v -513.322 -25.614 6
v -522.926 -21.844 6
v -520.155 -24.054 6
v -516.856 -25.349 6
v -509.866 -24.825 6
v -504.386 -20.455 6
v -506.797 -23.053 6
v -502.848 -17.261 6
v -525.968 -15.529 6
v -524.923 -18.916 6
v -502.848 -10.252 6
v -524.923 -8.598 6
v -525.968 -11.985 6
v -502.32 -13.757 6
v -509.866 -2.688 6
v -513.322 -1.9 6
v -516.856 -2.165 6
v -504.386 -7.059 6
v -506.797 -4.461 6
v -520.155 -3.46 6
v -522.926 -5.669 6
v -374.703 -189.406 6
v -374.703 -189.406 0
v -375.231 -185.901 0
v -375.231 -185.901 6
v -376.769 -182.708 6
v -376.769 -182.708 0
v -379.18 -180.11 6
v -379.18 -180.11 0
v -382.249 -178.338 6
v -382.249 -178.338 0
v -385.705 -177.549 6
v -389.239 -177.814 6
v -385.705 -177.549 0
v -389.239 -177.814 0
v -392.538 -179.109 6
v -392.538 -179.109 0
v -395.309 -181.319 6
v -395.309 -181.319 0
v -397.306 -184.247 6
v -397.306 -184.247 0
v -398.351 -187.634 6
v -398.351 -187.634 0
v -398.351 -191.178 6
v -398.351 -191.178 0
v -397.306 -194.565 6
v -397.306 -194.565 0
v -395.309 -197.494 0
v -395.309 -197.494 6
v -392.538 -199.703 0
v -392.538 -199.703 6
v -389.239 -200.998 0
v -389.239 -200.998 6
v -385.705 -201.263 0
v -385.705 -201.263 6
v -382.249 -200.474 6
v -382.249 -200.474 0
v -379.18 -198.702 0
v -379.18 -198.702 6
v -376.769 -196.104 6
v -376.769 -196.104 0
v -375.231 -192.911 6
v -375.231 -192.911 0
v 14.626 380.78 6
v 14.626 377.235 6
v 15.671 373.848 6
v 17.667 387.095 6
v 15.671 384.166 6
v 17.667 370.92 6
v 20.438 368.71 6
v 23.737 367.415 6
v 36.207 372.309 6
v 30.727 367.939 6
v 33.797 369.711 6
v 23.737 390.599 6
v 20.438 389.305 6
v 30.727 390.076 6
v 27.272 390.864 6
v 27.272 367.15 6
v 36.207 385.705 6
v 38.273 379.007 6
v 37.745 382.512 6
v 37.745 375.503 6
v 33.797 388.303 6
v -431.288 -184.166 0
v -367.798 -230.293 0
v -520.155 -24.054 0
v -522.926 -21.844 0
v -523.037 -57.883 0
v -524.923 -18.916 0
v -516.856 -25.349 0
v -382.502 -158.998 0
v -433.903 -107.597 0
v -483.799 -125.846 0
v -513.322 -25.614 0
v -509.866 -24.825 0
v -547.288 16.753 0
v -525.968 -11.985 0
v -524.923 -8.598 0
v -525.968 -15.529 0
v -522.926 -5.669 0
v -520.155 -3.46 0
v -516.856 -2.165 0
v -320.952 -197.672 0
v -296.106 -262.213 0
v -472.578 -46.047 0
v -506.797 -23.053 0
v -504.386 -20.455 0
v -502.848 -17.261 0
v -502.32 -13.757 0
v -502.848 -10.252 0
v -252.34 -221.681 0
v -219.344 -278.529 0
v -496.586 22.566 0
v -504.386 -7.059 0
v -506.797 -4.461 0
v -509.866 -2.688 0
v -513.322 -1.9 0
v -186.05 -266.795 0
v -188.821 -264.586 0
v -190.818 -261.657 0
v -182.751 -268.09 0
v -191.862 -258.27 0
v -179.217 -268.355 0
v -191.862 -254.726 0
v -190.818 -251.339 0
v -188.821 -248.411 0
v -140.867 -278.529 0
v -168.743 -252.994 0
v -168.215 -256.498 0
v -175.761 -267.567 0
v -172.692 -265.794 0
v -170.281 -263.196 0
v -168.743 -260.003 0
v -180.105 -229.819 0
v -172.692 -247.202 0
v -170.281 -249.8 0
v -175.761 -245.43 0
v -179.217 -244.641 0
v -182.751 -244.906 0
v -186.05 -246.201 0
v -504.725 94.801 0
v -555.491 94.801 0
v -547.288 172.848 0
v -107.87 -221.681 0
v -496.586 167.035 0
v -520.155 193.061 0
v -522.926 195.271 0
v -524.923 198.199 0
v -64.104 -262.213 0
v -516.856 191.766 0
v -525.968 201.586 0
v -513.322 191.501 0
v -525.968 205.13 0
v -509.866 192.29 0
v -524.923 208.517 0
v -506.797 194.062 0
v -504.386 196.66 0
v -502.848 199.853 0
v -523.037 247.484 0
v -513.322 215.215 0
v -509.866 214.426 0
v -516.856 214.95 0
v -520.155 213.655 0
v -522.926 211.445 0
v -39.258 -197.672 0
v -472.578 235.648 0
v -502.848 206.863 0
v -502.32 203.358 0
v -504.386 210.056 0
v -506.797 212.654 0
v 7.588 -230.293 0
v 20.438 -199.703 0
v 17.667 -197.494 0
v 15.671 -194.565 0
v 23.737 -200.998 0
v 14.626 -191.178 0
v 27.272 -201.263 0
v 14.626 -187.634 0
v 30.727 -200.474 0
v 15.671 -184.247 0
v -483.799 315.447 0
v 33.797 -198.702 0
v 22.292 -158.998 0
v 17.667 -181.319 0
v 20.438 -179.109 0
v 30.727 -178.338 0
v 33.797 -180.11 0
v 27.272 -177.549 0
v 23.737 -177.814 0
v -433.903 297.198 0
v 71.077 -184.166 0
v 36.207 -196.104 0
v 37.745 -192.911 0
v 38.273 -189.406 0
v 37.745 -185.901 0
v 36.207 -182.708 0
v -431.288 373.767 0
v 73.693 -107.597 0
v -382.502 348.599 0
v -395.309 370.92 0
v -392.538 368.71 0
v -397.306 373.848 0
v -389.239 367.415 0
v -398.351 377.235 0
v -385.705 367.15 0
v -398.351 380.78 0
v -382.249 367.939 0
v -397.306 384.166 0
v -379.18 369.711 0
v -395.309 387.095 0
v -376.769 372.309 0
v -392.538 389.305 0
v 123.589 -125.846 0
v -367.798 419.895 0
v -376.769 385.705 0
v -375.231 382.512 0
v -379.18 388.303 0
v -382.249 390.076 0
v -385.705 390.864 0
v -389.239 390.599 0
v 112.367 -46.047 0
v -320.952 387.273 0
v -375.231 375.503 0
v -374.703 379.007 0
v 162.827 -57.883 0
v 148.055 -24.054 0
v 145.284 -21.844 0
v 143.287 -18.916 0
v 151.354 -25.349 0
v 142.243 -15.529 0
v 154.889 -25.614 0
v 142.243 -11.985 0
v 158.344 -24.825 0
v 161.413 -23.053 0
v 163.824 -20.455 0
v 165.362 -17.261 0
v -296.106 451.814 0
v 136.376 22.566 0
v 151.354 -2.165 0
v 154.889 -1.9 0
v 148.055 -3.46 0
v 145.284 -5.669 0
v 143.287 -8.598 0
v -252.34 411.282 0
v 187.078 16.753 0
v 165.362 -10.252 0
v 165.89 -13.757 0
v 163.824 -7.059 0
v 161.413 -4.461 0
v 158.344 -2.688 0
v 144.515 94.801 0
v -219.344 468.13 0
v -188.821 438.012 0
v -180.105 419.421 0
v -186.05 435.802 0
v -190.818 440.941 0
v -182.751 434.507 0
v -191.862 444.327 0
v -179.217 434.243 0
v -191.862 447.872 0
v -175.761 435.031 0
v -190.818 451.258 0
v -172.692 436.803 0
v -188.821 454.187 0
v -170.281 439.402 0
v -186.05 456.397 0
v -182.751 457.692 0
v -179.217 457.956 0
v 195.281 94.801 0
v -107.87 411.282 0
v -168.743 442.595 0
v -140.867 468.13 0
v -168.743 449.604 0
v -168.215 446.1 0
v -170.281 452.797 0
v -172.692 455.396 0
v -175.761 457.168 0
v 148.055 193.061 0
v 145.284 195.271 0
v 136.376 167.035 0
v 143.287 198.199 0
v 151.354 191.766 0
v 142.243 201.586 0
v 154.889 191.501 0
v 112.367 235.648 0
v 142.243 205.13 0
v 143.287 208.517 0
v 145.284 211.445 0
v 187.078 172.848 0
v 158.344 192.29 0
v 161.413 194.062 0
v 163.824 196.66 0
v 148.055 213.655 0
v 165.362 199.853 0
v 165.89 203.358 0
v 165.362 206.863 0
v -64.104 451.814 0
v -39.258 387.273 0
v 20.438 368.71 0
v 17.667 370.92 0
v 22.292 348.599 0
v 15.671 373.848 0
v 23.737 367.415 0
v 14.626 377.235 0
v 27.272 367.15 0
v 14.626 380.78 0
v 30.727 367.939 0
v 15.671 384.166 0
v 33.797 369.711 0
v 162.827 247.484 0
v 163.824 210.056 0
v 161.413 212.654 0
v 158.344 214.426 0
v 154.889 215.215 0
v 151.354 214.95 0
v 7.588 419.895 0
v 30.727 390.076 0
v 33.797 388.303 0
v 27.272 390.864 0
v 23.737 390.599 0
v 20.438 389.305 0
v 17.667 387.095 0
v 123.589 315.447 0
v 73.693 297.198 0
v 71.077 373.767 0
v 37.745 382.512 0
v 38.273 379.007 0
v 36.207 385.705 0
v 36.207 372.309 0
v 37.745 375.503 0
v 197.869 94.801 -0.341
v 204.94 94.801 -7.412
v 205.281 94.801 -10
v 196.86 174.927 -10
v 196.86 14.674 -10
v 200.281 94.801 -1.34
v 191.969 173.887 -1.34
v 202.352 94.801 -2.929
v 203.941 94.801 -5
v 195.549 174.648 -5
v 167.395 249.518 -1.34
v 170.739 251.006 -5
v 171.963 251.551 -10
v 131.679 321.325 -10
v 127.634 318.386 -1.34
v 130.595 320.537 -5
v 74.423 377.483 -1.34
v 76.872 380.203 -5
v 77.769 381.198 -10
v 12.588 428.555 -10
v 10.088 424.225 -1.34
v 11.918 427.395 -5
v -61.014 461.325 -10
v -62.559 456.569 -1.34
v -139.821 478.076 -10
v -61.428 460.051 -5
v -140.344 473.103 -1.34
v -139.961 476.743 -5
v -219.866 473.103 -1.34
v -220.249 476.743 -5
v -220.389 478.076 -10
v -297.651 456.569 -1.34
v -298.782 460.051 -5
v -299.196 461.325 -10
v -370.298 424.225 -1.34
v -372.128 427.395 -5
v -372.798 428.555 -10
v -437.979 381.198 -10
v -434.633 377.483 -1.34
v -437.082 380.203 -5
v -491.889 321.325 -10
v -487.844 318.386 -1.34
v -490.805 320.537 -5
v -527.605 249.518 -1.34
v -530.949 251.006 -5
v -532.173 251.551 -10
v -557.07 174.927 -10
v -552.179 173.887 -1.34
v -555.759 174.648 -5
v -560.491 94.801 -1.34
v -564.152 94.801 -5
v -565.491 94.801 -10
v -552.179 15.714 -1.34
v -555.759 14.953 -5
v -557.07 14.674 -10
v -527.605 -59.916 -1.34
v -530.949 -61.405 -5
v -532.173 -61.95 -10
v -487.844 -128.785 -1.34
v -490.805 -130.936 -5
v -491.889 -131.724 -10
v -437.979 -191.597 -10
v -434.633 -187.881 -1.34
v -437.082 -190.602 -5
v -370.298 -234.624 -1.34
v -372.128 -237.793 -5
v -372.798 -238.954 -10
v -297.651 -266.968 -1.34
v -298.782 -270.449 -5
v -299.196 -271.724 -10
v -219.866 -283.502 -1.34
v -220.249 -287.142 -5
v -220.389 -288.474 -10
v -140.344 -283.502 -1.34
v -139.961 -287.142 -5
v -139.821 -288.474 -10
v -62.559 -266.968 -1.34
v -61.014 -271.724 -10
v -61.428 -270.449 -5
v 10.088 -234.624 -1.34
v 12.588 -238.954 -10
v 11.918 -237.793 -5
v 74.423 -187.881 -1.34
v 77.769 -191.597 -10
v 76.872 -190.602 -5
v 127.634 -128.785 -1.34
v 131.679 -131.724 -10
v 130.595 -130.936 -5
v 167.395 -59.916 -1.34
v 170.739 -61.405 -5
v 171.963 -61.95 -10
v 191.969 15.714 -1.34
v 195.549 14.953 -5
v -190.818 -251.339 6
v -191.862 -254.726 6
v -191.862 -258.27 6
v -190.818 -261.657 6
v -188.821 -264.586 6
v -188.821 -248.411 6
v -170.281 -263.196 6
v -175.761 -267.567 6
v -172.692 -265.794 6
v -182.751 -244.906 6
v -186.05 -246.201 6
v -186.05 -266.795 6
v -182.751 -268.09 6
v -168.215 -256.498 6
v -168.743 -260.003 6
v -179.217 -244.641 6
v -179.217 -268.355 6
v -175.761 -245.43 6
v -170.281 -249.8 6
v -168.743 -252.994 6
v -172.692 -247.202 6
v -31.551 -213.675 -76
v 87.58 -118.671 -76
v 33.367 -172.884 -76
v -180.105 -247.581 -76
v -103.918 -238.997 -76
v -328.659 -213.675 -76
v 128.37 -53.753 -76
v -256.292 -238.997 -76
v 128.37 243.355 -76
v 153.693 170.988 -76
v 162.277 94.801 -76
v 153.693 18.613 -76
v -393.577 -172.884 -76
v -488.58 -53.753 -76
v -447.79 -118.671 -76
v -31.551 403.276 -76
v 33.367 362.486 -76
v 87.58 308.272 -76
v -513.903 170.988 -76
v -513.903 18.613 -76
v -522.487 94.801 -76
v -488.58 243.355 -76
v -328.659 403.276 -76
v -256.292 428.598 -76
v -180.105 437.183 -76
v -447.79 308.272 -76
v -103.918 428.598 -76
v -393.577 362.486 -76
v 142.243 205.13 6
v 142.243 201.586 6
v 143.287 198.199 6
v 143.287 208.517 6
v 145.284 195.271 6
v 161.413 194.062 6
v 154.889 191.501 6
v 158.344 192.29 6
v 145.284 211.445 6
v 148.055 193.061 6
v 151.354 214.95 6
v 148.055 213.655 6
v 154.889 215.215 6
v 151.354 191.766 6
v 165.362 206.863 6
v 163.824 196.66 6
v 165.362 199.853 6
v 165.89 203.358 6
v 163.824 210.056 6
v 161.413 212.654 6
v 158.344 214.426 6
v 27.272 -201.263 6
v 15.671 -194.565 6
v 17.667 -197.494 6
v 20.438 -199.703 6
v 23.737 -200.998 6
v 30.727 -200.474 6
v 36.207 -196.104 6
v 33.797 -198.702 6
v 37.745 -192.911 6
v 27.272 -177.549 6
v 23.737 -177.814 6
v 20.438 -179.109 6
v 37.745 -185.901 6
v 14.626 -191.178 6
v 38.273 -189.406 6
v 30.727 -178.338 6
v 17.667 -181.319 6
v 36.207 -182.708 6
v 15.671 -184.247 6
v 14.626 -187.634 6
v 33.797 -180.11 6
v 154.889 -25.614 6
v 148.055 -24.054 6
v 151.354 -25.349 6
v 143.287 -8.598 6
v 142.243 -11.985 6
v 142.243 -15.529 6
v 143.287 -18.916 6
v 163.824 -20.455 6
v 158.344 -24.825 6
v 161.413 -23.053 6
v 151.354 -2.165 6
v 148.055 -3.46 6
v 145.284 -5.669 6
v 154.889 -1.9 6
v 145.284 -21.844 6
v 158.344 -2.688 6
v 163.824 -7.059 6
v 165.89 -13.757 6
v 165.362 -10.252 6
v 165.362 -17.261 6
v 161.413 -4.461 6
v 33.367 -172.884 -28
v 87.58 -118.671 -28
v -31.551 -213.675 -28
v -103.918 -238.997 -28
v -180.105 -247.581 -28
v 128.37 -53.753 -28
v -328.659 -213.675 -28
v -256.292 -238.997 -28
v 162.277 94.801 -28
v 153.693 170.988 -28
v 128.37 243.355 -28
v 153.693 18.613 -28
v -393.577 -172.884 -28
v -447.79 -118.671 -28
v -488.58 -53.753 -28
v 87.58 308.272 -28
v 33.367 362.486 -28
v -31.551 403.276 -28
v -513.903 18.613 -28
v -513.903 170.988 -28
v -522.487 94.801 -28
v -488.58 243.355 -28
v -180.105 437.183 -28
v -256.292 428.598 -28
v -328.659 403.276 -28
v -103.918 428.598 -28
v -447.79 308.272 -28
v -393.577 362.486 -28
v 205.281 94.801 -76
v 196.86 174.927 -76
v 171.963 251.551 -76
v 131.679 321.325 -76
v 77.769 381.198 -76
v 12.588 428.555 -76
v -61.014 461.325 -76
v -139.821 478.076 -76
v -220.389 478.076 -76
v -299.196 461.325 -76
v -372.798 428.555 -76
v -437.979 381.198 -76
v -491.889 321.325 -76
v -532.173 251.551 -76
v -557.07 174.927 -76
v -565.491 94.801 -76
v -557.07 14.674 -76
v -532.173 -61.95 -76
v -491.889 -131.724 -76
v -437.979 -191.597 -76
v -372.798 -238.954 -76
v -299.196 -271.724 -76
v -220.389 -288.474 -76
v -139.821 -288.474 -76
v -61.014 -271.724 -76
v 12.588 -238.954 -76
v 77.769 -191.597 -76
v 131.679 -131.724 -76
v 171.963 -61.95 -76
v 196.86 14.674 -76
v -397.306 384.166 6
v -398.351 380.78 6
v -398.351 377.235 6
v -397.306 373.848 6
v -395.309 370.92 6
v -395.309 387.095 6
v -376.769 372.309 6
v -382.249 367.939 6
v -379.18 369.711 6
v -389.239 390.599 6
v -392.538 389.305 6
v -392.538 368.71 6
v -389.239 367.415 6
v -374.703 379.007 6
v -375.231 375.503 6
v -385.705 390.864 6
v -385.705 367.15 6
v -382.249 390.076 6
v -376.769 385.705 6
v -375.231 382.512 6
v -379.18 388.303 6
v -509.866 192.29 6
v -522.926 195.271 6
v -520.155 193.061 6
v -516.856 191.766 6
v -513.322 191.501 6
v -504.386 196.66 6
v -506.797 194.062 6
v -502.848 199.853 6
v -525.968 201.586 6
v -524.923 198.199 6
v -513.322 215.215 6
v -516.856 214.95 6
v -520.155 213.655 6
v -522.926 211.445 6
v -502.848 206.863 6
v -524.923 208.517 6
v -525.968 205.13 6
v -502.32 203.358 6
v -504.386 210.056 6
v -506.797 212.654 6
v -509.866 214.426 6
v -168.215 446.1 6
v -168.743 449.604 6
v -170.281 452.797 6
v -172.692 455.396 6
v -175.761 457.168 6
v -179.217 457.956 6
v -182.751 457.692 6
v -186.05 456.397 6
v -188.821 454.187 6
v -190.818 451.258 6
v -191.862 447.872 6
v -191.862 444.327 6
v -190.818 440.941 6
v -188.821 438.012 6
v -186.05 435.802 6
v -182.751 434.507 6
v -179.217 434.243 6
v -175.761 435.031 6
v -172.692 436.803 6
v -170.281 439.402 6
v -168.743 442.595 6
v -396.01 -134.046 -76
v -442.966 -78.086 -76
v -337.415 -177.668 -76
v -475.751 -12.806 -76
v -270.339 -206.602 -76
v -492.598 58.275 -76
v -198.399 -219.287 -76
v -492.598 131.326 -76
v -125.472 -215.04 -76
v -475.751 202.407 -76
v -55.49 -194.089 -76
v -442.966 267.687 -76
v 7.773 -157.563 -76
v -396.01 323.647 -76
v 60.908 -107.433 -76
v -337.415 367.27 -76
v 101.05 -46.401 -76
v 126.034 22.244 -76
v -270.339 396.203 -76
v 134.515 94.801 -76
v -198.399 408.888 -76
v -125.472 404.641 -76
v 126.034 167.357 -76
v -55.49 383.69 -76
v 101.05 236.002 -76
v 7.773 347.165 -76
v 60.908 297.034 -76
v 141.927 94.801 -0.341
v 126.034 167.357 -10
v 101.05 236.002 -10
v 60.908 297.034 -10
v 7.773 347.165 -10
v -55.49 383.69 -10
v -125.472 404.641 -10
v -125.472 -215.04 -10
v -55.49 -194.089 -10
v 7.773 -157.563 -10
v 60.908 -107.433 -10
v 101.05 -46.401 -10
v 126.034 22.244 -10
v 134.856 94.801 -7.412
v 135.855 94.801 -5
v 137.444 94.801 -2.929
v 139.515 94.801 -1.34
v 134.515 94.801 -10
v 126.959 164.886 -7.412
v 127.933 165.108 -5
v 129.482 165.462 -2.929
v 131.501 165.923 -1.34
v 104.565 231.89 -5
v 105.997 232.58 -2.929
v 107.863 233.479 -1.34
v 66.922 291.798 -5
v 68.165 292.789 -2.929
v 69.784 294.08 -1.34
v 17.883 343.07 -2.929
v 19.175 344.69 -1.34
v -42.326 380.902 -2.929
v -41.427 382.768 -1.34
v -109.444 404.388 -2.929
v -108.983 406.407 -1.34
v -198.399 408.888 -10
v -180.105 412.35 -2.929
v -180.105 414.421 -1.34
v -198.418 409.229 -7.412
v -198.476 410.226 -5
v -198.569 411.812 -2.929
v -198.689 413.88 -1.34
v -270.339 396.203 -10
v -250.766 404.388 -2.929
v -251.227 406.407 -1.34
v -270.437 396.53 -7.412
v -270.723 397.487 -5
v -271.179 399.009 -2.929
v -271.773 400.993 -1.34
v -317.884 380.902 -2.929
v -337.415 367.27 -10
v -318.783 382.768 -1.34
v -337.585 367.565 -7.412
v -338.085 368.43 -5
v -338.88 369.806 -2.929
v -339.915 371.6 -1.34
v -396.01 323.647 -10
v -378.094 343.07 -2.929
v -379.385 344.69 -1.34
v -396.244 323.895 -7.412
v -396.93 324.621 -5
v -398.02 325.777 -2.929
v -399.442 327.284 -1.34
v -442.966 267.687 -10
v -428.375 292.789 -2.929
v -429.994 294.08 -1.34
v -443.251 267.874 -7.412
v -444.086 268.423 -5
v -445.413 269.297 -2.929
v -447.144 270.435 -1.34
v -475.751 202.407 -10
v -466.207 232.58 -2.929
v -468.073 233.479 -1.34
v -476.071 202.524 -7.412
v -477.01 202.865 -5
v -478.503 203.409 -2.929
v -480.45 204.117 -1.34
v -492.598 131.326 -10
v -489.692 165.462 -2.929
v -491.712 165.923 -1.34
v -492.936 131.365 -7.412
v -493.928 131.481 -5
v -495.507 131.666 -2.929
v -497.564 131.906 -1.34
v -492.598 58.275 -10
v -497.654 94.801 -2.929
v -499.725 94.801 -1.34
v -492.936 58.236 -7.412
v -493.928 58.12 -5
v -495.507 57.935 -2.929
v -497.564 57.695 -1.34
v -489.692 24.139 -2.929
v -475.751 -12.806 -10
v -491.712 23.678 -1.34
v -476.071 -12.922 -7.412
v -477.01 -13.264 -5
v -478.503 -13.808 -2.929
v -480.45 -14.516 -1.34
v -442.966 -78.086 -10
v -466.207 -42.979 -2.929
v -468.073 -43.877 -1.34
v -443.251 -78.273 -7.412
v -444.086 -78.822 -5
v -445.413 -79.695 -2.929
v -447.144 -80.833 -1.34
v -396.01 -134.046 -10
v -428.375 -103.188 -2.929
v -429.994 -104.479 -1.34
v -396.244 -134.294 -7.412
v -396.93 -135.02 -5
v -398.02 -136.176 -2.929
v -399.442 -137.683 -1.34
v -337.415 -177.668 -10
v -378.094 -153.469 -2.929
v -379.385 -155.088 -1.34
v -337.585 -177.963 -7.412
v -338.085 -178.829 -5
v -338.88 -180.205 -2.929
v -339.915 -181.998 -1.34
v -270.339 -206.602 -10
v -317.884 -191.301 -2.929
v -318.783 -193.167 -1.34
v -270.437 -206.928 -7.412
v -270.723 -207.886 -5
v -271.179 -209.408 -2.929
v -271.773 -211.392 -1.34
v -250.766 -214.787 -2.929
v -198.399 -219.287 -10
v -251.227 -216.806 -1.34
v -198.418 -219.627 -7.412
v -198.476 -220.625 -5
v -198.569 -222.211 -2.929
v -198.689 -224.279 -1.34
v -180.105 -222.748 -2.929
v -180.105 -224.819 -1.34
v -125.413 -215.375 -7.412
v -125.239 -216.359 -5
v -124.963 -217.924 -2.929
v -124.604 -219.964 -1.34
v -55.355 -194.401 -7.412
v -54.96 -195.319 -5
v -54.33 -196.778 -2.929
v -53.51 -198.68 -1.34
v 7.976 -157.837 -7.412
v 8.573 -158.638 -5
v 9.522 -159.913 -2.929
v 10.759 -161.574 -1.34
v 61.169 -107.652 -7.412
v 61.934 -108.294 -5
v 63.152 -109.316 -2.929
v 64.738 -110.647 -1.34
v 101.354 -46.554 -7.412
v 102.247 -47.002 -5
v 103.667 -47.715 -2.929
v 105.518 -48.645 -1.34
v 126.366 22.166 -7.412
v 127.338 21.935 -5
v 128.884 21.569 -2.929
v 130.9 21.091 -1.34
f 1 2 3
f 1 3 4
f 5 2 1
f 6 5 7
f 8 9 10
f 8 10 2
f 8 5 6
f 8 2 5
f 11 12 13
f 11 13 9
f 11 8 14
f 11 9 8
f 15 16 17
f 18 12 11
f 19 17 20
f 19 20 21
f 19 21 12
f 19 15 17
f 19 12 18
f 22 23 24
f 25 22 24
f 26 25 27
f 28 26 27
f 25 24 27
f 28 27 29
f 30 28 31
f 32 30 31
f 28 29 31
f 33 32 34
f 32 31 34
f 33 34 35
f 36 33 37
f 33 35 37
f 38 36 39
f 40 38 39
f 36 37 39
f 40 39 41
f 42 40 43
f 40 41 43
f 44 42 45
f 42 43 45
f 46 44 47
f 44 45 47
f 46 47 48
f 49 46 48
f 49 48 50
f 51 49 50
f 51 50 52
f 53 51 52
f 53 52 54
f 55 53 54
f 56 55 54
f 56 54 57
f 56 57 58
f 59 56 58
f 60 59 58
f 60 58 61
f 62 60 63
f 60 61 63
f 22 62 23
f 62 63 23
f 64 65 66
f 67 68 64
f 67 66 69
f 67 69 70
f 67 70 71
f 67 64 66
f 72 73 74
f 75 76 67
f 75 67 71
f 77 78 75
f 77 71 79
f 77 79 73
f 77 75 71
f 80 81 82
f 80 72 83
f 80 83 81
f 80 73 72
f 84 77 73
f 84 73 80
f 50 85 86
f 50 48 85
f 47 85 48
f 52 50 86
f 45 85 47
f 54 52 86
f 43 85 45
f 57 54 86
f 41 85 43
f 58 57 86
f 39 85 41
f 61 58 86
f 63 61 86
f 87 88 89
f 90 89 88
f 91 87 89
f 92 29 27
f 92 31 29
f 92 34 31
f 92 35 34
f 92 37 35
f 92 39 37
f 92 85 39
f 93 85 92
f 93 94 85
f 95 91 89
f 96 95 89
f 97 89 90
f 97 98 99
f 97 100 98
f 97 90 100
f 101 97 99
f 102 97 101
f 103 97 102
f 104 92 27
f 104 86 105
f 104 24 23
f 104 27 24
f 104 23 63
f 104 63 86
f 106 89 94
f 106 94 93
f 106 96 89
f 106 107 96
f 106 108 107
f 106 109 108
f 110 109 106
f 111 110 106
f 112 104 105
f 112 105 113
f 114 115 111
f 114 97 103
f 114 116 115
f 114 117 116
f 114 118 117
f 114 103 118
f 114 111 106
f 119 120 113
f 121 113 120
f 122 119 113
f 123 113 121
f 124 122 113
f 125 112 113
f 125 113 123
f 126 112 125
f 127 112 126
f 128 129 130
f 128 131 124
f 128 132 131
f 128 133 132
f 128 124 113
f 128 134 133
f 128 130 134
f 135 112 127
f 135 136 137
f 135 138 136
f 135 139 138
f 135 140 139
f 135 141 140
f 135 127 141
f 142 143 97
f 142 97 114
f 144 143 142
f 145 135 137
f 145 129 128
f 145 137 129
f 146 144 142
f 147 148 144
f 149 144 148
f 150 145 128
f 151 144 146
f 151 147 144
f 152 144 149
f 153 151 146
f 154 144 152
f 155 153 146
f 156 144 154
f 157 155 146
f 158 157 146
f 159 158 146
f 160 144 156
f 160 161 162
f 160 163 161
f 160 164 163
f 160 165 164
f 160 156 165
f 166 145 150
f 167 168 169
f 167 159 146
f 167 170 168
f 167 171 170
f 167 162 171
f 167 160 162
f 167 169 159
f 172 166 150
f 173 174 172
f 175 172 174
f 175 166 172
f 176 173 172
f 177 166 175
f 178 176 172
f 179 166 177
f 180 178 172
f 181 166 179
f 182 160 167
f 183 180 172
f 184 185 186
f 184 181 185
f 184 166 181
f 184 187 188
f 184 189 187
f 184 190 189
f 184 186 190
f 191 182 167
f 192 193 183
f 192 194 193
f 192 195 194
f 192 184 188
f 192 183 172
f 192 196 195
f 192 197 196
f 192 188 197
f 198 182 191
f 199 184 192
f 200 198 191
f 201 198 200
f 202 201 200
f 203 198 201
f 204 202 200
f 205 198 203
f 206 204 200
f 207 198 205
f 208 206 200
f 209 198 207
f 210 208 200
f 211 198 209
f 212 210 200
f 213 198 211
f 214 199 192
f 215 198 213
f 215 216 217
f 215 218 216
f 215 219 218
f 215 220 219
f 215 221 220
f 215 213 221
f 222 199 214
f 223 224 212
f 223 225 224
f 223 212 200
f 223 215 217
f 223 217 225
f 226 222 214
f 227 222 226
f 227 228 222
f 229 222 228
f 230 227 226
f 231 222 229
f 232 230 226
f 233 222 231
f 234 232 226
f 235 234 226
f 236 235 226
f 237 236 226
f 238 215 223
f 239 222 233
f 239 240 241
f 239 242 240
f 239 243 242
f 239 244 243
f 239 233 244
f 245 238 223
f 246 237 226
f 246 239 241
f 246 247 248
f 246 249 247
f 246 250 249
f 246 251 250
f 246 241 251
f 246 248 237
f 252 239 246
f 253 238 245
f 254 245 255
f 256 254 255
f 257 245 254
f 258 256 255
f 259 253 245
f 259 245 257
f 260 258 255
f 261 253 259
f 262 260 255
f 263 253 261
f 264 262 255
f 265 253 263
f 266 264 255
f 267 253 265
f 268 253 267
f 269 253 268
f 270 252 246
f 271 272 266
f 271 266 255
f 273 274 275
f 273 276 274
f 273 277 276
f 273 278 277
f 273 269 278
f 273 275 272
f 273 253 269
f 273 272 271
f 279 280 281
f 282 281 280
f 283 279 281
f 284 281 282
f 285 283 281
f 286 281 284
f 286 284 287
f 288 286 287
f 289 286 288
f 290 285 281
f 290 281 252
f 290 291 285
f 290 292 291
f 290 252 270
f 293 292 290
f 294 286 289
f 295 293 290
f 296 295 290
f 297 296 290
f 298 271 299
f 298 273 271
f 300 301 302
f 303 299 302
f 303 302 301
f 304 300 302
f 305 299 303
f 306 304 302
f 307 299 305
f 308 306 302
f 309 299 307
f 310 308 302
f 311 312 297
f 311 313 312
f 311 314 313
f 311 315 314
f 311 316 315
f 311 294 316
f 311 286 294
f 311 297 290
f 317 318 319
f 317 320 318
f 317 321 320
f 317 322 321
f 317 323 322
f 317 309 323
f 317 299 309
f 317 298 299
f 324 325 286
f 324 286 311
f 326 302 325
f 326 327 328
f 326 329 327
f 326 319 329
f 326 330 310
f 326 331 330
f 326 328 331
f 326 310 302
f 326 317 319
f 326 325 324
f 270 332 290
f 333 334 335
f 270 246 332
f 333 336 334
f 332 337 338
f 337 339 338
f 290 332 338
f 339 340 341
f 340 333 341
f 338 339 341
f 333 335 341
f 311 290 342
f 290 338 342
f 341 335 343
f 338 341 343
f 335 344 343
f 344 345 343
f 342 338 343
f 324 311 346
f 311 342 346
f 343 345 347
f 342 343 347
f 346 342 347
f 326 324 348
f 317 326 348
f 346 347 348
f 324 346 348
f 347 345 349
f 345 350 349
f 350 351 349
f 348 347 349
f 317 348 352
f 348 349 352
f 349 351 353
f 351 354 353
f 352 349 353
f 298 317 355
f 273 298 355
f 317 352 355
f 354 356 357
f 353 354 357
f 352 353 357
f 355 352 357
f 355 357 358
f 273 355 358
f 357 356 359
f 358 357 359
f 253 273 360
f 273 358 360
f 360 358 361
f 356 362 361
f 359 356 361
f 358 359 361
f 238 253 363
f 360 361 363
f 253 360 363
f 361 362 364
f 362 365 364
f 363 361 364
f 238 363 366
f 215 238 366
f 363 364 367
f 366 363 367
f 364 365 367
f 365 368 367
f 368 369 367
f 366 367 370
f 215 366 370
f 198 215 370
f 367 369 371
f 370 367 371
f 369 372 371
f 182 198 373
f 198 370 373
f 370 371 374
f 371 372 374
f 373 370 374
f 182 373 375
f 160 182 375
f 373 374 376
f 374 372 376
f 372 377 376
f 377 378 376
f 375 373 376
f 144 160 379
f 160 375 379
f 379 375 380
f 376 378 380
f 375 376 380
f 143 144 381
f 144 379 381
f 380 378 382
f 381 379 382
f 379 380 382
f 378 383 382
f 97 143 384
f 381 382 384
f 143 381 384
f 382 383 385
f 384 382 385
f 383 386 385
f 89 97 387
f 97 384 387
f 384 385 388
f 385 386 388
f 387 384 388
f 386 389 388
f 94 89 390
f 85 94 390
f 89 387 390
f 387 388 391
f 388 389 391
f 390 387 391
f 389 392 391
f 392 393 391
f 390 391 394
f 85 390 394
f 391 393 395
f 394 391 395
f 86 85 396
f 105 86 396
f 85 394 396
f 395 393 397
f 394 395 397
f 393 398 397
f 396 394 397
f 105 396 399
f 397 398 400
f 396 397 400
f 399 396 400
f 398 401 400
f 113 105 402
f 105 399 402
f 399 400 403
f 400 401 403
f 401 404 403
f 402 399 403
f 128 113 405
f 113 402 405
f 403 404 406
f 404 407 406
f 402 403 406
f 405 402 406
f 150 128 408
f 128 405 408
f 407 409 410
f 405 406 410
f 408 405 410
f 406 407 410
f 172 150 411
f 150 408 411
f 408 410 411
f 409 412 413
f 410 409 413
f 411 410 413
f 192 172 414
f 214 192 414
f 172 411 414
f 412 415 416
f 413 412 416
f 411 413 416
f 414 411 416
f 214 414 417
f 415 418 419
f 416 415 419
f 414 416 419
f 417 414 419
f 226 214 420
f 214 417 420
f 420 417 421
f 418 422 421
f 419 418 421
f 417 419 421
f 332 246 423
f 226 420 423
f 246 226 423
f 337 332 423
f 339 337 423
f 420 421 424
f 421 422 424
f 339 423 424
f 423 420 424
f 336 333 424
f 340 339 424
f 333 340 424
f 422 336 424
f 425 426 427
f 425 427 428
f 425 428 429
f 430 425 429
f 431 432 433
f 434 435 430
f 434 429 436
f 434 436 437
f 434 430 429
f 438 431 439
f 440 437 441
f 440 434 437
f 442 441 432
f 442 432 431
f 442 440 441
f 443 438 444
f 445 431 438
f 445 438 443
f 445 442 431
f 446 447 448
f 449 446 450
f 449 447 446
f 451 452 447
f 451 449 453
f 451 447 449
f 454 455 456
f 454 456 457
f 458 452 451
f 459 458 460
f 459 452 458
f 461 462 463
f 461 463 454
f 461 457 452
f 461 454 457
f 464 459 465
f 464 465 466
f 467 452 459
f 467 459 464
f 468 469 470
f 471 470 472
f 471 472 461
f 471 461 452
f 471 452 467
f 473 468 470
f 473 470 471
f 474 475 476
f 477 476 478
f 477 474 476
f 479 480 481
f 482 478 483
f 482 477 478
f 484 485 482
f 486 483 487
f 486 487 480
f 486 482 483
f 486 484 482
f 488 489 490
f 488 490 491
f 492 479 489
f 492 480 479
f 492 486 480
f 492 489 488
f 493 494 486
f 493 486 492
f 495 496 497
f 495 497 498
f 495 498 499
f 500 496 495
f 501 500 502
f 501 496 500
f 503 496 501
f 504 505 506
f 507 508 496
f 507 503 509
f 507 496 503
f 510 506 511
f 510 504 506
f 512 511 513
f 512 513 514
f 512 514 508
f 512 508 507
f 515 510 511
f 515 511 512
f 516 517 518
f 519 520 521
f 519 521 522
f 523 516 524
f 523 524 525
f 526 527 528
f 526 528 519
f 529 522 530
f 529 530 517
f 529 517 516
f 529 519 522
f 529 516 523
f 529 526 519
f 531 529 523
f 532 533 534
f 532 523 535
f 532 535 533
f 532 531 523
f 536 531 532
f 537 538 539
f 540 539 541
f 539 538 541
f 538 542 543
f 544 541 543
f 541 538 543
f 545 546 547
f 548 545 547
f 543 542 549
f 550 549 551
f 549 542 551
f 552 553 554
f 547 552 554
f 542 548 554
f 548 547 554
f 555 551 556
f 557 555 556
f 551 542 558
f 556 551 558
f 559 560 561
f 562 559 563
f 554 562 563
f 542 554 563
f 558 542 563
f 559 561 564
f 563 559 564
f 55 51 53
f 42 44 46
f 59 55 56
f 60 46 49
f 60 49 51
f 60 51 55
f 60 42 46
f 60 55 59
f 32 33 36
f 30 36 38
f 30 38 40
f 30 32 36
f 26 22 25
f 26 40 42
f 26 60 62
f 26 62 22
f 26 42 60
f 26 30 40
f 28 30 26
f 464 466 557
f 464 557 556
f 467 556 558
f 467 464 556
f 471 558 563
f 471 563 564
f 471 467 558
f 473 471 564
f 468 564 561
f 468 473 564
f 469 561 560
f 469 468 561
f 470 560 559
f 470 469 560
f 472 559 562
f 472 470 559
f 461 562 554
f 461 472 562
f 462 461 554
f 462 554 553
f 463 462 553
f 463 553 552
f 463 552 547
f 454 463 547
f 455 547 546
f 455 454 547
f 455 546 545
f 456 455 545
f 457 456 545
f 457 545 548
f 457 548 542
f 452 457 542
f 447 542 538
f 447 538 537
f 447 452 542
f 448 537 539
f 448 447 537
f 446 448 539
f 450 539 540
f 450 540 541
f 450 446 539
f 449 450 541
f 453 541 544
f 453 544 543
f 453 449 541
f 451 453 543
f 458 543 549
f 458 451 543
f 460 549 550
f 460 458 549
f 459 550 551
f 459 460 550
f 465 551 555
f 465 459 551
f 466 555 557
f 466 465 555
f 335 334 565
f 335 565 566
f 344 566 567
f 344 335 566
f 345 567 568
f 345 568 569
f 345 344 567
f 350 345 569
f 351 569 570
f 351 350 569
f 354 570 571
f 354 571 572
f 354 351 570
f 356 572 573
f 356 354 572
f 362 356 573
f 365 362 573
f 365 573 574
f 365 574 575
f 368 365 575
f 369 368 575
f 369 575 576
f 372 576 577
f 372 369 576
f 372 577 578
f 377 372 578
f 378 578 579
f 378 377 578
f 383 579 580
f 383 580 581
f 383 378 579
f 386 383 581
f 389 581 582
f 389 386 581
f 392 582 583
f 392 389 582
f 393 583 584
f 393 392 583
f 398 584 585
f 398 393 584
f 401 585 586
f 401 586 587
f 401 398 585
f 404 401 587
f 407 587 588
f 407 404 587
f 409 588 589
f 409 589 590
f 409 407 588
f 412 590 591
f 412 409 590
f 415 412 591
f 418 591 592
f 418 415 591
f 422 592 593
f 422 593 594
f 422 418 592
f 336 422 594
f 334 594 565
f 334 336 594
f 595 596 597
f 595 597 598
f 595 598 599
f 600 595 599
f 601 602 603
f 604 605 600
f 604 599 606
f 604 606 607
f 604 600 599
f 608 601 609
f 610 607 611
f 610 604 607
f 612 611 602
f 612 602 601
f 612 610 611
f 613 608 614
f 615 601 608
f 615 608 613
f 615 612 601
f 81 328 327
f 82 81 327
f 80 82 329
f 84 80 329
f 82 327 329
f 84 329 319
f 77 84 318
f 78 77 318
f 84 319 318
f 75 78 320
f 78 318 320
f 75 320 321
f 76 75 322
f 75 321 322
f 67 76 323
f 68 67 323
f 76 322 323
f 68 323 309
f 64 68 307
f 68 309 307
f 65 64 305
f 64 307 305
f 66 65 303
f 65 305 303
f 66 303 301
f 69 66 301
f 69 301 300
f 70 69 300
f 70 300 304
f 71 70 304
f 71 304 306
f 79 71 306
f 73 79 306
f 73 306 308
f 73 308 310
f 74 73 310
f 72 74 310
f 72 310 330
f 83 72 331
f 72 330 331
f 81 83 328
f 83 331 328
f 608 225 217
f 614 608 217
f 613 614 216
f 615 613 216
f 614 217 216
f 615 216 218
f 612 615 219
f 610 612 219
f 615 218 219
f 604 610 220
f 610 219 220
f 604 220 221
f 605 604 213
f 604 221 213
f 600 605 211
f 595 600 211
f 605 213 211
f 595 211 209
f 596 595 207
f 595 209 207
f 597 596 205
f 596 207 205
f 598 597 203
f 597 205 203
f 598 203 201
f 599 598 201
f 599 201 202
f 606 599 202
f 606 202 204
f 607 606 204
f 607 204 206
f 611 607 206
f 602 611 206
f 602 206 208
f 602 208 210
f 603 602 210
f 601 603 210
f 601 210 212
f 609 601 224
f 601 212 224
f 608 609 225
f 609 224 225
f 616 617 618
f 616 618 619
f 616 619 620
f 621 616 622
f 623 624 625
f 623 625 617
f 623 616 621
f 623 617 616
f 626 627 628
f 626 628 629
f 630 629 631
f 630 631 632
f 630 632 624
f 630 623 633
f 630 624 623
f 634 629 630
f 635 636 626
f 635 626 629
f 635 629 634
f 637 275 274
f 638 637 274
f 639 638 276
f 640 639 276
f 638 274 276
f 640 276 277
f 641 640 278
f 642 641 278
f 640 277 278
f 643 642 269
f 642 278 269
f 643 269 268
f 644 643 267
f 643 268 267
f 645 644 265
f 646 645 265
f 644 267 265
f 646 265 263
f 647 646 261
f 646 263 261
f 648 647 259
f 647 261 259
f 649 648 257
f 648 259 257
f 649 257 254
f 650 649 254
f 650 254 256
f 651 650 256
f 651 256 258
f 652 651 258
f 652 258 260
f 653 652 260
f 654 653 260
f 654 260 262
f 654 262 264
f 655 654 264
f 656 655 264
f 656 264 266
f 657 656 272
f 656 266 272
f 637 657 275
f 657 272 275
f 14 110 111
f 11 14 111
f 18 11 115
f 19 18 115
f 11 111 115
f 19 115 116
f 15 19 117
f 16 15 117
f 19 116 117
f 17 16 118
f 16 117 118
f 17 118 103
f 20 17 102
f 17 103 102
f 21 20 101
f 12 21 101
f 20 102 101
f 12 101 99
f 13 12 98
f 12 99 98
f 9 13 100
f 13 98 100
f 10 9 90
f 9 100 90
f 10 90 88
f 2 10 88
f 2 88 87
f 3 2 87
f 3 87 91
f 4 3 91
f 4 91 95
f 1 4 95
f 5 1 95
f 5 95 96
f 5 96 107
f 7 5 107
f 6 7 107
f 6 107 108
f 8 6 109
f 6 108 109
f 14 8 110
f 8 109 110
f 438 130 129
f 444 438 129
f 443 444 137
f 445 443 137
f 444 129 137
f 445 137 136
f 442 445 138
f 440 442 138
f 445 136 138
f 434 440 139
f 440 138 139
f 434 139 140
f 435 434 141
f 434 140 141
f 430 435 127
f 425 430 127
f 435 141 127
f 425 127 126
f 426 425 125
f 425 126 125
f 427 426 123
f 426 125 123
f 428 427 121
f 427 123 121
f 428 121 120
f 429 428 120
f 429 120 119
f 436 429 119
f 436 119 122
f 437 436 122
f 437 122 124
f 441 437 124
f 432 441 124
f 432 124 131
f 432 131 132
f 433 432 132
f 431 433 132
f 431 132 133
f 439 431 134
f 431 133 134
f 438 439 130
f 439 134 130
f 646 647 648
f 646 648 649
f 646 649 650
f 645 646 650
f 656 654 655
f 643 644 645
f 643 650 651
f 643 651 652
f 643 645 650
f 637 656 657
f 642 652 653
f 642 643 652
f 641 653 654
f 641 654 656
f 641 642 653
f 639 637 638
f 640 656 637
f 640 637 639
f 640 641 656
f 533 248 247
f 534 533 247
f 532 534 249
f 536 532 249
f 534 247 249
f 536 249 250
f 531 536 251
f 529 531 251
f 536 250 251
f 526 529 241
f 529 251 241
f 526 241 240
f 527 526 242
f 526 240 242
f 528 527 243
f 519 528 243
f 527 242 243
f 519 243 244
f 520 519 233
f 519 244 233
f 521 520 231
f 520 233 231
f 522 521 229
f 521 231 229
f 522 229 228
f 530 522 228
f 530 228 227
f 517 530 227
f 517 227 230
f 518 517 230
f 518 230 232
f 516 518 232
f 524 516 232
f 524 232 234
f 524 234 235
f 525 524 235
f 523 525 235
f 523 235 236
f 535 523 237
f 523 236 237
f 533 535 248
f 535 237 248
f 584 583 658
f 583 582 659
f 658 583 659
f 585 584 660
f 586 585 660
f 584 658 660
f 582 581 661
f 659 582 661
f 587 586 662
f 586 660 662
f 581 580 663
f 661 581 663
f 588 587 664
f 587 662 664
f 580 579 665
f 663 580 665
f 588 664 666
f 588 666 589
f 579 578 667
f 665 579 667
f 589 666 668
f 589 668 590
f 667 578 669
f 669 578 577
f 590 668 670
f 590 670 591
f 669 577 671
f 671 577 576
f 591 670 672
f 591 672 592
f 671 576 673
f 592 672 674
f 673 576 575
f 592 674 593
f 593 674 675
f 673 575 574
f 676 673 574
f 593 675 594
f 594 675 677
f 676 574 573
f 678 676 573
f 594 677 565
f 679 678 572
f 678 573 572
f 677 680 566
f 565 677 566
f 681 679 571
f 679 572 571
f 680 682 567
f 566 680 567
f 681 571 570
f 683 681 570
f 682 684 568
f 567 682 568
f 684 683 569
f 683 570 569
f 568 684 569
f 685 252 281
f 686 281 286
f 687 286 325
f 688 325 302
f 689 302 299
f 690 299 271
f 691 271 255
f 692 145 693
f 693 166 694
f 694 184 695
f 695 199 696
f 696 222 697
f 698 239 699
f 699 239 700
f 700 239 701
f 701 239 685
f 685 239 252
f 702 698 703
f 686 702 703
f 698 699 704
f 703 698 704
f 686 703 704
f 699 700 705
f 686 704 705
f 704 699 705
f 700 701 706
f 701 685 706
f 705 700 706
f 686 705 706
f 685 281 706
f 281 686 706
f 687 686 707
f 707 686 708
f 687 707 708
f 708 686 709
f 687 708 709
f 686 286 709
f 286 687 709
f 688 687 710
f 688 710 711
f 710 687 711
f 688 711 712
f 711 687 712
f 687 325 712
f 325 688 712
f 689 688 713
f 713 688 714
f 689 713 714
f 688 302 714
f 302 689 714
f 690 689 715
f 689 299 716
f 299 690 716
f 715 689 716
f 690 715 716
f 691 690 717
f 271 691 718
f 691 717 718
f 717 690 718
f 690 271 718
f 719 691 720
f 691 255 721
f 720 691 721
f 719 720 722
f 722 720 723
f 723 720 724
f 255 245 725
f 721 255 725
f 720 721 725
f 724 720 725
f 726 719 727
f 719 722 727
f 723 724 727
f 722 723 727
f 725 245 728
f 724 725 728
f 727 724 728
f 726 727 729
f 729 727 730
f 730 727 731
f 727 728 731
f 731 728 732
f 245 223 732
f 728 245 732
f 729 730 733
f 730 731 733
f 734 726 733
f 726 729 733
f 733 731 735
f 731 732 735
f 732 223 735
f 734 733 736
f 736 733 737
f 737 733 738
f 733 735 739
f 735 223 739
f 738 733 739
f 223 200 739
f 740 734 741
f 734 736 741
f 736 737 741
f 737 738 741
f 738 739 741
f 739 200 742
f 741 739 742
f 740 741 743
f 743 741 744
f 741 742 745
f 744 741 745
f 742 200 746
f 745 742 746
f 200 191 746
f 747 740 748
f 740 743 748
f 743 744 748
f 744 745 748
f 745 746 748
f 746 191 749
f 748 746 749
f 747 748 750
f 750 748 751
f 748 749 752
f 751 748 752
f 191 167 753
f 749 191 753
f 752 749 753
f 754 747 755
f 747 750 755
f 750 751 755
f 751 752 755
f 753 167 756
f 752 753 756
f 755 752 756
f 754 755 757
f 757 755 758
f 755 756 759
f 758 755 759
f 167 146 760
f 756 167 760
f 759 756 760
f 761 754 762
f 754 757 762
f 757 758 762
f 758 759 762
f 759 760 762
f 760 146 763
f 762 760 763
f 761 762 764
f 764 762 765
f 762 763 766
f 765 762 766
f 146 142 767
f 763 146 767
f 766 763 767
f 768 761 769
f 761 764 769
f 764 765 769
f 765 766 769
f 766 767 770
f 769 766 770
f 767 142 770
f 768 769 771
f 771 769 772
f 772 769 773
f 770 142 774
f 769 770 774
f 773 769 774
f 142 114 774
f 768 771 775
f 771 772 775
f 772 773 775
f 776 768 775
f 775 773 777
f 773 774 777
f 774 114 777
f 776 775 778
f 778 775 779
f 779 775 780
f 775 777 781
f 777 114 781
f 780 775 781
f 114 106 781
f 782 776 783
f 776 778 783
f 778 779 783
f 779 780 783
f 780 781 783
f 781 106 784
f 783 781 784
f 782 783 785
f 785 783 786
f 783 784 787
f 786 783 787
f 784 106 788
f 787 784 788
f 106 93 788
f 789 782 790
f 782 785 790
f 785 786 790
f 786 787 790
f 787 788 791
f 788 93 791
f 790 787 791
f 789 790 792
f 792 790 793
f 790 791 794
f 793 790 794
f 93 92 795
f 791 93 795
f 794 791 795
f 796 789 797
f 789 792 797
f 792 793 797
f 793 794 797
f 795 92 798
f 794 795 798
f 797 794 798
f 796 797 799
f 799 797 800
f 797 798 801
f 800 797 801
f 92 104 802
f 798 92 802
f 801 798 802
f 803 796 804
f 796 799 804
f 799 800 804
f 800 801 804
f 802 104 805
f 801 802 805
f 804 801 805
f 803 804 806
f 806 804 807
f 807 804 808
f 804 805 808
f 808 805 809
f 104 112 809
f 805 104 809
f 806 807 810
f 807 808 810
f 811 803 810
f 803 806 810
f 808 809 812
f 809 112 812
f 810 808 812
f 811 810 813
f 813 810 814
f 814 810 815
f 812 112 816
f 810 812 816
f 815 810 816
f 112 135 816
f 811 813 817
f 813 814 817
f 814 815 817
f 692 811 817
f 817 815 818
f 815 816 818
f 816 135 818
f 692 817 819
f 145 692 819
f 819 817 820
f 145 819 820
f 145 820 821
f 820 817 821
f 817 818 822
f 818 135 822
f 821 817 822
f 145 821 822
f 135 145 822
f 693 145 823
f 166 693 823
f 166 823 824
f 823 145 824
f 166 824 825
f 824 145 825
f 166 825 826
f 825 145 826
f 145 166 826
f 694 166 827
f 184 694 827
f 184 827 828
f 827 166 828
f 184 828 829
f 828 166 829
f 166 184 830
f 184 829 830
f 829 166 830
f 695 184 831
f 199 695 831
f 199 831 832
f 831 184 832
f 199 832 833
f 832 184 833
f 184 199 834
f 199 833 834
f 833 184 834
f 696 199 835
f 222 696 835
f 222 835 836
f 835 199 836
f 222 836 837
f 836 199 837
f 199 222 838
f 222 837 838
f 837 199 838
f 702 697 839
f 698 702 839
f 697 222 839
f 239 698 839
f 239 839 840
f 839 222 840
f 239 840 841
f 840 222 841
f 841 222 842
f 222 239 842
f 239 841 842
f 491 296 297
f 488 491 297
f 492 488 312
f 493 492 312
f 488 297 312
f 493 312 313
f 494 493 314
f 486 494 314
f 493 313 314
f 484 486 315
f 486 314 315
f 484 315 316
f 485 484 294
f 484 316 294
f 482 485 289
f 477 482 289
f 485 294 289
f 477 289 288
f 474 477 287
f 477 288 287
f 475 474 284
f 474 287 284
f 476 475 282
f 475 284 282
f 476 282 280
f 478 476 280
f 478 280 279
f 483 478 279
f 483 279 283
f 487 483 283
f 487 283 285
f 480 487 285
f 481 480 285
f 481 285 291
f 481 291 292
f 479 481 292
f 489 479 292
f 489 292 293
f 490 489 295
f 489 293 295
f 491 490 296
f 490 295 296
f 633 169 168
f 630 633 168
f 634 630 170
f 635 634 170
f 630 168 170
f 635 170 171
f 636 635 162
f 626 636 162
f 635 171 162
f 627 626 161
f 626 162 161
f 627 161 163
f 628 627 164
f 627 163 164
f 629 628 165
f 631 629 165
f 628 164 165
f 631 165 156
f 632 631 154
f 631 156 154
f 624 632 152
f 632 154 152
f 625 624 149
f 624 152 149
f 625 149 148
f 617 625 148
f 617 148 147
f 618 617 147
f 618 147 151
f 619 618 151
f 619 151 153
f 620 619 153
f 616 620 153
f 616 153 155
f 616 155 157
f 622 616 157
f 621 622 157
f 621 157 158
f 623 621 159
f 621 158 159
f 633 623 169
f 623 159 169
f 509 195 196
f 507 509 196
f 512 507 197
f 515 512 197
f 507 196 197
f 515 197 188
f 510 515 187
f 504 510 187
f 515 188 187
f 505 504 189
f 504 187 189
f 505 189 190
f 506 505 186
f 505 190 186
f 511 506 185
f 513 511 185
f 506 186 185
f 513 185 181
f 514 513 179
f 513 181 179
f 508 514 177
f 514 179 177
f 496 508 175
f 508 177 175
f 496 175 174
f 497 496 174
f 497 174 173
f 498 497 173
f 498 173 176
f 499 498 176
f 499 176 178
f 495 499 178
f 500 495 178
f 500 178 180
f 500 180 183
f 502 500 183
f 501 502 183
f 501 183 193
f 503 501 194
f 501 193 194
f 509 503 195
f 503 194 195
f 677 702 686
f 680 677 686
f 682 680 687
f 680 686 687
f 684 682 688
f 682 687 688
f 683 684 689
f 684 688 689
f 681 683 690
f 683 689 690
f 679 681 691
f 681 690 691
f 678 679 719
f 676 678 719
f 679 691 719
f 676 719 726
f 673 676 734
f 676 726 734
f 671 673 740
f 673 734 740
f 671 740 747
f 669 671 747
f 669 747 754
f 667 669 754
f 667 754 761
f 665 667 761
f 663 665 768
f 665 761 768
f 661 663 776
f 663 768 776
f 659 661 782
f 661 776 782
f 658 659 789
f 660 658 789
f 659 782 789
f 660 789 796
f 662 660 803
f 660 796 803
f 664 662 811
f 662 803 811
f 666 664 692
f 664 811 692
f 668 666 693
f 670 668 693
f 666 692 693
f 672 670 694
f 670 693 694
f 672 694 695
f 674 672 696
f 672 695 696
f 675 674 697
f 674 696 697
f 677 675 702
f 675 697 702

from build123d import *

# Parameters (mm, degrees)
SKETCH1_R           = 385.386266527
SKETCH1_R_2         = 314.620020727
BOSS_EXTRUDE1_DEPTH = 76
SKETCH2_R           = 342.381897502
BOSS_EXTRUDE2_DEPTH = 48
FILLET2_R           = 10
FILLET3_R           = 10
SKETCH3_R           = 11.890150021
BOSS_EXTRUDE3_DEPTH = 6


with BuildPart() as part:
    # Sketch1 → Boss-Extrude1 (new body)
    with BuildSketch(Plane.XY):
        with Locations((-180.105067614, 94.800611997)):
            Circle(SKETCH1_R)
        with Locations((-180.105067614, 94.800611997)):
            Circle(SKETCH1_R_2, mode=Mode.SUBTRACT)
    extrude(amount=-BOSS_EXTRUDE1_DEPTH)

    # Fillet2
    fillet2_edges = [part.edges().sort_by_distance(p)[0] for p in [
        (-494.725088342, 94.800611997, 0),
    ]]
    fillet(fillet2_edges, radius=FILLET2_R)

    # Fillet3
    fillet3_edges = [part.edges().sort_by_distance(p)[0] for p in [
        (-565.491334141, 94.800611997, 0),
    ]]
    fillet(fillet3_edges, radius=FILLET3_R)

    # Sketch3 → Boss-Extrude3 (add)
    with BuildSketch(Plane.XY):
        with Locations((26.383251483, 379.007401192)):
            Circle(SKETCH3_R)
        with Locations((-180.105067614, 446.099523109)):
            Circle(SKETCH3_R)
        with Locations((154.000050965, 203.357945636)):
            Circle(SKETCH3_R)
        with Locations((154.000050965, -13.756721642)):
            Circle(SKETCH3_R)
        with Locations((26.383251483, -189.406177197)):
            Circle(SKETCH3_R)
        with Locations((-180.105067614, -256.498299114)):
            Circle(SKETCH3_R)
        with Locations((-386.593386712, -189.406177197)):
            Circle(SKETCH3_R)
        with Locations((-514.210186194, -13.756721642)):
            Circle(SKETCH3_R)
        with Locations((-514.210186194, 203.357945636)):
            Circle(SKETCH3_R)
        with Locations((-386.593386712, 379.007401192)):
            Circle(SKETCH3_R)
    extrude(amount=BOSS_EXTRUDE3_DEPTH)


with BuildPart() as body_2:
    # Sketch2 → Boss-Extrude2 (new body)
    with BuildSketch(Plane(origin=(0, 0, -76), x_dir=(-1, 0, 0), z_dir=(0, 0, -1))):
        with Locations((180.105067614, 94.800611997)):
            Circle(SKETCH2_R)
    extrude(amount=-BOSS_EXTRUDE2_DEPTH)


solid = Compound([part.part, body_2.part])
